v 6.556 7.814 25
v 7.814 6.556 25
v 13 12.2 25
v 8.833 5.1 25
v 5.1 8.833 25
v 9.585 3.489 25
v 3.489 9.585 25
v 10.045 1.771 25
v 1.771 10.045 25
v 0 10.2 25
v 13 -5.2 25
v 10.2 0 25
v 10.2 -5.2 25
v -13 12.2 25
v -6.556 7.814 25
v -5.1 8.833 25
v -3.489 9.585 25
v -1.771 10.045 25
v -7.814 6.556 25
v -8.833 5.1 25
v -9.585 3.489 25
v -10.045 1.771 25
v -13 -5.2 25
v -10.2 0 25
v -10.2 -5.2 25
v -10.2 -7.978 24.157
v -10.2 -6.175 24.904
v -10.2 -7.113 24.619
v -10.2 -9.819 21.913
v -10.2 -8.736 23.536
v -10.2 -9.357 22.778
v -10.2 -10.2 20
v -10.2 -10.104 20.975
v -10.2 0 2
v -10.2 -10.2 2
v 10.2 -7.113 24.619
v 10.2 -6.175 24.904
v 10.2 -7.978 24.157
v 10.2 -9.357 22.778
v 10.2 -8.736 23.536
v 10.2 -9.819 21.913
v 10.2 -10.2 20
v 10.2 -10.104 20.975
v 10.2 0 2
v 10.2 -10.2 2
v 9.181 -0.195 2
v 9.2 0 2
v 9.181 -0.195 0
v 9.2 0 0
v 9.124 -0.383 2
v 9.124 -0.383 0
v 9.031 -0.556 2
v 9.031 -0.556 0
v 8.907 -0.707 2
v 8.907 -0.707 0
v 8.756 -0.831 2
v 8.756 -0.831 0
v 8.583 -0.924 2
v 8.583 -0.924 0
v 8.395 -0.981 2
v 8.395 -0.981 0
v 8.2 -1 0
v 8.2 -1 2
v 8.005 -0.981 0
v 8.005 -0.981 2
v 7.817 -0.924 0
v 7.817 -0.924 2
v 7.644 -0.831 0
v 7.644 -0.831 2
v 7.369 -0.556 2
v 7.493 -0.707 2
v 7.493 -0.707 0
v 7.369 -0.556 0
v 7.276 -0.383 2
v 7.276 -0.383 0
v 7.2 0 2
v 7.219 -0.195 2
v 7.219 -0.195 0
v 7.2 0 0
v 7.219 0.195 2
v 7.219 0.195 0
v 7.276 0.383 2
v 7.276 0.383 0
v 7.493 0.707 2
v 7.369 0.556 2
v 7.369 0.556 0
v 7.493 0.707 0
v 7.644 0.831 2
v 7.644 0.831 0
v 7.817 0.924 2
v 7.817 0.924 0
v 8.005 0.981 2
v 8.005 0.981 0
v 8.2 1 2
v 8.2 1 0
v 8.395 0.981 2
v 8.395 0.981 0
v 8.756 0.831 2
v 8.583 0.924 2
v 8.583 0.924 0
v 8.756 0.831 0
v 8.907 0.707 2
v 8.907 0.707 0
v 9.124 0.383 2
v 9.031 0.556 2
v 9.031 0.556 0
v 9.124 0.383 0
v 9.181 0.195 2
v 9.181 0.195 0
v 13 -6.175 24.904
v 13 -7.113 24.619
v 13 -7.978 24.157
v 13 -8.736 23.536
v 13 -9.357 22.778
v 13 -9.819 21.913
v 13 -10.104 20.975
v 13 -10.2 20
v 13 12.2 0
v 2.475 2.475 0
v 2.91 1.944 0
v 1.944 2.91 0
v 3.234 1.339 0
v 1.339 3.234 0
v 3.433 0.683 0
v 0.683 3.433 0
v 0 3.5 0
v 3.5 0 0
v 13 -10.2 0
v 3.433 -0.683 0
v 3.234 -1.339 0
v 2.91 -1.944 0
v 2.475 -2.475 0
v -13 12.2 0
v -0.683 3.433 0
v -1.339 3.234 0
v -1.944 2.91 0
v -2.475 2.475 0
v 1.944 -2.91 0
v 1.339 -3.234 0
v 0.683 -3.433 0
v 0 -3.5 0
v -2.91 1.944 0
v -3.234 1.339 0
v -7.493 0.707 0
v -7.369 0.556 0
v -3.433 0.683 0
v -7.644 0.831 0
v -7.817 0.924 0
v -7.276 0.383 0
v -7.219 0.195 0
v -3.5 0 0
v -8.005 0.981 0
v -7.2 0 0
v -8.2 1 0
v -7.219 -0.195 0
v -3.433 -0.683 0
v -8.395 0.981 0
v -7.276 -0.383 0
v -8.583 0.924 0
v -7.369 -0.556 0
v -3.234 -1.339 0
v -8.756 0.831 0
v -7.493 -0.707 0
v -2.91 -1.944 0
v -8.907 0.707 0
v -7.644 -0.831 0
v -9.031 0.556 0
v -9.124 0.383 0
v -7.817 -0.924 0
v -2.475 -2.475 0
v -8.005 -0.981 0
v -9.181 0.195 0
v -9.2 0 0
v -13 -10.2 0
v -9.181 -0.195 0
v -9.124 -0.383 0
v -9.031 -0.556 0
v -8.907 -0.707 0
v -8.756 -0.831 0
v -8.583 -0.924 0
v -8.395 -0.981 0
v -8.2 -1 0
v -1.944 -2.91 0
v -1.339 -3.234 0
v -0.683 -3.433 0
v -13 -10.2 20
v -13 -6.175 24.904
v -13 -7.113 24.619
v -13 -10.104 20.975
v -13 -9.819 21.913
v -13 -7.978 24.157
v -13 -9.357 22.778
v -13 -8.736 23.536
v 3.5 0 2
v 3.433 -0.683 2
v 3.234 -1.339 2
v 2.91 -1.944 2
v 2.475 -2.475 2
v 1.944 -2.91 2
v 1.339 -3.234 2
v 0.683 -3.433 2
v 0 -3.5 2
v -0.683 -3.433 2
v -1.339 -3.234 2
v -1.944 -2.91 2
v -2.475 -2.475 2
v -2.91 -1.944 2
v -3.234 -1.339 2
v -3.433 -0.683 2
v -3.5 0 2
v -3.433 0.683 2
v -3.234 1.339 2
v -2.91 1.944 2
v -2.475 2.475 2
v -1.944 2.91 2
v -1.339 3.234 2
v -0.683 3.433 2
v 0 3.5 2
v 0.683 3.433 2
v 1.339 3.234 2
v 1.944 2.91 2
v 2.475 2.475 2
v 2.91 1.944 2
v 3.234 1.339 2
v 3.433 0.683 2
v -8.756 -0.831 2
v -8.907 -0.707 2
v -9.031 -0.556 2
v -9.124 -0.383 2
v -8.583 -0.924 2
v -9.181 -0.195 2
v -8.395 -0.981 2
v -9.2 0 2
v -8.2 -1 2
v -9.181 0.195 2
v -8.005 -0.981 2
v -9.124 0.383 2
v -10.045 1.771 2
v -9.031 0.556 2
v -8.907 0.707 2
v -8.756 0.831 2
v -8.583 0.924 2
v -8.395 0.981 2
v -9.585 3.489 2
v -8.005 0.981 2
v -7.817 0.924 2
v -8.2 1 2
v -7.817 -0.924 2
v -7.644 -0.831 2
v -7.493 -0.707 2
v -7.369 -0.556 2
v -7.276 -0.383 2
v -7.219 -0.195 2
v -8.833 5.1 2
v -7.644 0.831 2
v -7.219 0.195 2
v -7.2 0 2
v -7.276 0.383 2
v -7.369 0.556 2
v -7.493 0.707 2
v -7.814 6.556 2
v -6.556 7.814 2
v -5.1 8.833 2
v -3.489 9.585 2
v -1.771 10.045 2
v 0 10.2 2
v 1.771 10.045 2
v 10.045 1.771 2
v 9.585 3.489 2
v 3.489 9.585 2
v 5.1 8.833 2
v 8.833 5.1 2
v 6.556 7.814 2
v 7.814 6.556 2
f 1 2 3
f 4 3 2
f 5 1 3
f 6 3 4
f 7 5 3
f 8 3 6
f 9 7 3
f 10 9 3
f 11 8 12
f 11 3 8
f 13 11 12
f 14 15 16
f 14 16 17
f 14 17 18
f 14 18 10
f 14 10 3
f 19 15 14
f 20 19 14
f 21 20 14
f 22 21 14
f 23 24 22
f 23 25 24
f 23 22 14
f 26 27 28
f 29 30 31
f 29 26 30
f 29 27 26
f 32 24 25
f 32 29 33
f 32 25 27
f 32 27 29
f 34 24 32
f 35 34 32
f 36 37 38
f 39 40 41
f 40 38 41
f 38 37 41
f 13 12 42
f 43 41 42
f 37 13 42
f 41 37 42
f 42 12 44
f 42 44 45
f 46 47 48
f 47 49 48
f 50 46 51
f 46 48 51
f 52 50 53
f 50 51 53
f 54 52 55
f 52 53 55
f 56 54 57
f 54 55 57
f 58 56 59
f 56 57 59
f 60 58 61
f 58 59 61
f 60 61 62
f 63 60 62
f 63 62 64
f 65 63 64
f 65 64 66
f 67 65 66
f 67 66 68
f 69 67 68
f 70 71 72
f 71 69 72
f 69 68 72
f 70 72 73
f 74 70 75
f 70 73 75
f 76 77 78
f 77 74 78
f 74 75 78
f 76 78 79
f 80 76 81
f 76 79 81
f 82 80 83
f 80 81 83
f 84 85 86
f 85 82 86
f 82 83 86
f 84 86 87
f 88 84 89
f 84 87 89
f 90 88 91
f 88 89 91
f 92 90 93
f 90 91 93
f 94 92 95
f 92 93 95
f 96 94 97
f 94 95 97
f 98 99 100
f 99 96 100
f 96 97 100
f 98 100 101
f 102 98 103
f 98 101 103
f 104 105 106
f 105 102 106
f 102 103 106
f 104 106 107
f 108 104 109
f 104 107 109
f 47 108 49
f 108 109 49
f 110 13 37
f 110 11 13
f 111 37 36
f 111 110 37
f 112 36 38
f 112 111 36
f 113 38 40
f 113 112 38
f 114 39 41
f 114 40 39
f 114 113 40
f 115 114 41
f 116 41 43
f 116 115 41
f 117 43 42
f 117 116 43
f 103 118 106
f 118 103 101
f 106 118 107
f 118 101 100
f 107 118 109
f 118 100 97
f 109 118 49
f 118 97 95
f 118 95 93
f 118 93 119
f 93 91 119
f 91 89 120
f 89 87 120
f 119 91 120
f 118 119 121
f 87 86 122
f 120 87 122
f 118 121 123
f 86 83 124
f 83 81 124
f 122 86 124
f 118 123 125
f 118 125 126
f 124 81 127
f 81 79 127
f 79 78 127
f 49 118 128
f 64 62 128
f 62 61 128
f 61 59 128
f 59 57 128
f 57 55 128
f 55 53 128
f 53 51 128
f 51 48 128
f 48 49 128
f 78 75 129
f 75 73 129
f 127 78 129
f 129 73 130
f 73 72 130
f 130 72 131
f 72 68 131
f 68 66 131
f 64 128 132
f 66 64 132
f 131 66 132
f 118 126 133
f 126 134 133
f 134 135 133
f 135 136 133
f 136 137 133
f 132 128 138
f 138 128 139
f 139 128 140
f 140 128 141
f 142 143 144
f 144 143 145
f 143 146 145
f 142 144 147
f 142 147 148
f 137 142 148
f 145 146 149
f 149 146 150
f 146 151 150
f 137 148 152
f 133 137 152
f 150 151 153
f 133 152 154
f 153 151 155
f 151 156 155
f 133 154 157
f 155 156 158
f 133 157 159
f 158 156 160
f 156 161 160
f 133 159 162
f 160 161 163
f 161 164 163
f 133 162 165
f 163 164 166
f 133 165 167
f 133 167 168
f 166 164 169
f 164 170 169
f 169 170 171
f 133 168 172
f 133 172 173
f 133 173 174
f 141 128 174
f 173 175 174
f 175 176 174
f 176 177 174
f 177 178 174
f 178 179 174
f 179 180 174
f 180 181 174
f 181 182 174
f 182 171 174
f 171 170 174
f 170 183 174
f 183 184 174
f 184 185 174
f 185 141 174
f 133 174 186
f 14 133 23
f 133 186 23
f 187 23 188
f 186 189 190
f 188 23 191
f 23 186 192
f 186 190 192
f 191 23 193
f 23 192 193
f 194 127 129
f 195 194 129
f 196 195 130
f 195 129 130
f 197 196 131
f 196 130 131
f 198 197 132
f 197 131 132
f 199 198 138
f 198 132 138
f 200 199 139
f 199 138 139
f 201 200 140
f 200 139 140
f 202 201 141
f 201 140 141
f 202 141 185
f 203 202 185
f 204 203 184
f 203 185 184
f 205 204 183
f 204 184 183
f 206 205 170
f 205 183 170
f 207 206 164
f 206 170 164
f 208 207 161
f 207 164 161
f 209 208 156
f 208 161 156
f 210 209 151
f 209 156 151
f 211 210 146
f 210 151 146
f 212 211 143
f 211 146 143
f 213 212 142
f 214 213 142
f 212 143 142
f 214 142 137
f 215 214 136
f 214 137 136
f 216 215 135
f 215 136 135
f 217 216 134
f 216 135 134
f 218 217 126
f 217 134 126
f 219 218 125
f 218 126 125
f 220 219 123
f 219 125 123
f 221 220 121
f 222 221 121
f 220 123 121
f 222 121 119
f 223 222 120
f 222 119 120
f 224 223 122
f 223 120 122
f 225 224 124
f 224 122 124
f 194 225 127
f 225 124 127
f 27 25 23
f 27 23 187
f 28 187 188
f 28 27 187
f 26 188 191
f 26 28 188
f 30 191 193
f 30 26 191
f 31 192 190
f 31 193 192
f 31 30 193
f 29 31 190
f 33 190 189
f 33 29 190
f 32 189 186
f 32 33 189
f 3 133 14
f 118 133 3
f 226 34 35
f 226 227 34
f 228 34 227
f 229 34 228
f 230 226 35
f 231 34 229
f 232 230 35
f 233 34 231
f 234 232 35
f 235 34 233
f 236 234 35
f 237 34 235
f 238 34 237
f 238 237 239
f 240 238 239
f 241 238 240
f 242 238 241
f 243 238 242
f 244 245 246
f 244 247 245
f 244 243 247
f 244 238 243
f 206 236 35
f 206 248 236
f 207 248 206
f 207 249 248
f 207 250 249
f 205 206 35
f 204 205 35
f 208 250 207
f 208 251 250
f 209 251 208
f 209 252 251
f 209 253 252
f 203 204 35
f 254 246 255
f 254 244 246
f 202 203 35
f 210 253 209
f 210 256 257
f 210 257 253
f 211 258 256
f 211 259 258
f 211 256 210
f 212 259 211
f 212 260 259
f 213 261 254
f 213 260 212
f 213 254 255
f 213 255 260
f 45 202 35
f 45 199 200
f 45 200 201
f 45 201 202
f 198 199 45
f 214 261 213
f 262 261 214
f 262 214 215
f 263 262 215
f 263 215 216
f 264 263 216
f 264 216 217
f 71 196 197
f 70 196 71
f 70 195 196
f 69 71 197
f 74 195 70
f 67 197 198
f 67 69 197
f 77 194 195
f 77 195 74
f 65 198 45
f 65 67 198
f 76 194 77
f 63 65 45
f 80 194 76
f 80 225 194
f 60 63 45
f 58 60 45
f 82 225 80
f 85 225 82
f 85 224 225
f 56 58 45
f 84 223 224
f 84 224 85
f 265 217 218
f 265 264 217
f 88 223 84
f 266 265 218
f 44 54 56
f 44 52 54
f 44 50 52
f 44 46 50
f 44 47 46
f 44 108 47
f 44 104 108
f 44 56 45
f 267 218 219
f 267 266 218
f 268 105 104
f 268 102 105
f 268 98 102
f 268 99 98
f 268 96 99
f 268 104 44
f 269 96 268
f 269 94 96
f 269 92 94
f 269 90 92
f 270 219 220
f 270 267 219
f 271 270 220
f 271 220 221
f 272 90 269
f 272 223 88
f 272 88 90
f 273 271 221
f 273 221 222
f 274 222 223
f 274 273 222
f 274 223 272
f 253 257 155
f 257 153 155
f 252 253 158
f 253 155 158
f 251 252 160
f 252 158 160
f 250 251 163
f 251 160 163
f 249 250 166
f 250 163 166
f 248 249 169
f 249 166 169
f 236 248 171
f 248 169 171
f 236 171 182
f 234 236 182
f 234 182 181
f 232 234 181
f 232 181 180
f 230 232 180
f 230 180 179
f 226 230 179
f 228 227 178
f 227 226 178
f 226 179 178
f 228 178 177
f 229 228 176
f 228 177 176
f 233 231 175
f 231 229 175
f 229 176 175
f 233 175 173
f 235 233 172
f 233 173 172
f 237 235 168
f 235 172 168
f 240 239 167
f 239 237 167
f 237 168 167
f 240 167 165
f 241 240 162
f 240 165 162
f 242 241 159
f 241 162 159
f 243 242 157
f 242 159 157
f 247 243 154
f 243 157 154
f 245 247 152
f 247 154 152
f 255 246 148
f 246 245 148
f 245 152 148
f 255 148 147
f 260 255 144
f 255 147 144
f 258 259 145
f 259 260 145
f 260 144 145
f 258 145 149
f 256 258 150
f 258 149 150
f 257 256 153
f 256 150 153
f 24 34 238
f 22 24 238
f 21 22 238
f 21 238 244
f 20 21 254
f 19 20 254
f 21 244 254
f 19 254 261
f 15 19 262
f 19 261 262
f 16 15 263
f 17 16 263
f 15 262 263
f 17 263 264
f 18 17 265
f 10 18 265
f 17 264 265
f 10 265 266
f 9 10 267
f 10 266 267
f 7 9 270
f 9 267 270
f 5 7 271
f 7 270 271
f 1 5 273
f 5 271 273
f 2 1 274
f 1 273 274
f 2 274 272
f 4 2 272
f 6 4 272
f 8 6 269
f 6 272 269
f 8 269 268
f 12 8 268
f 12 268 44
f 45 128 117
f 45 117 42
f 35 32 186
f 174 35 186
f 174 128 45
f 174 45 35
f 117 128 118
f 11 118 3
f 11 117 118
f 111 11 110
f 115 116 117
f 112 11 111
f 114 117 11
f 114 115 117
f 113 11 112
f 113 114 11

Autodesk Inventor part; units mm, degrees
ref_plane "YZ Plane" through (0, 0, 0) normal (1, 0, 0) x (0, 1, 0)
ref_plane "XZ Plane" through (0, 0, 0) normal (0, 1, 0) x (-1, 0, 0)
ref_plane "XY Plane" through (0, 0, 0) normal (0, 0, 1) x (1, 0, 0)
sketch "StranaDoKotaca" plane through (0, 0, 0) normal (0, 0, 1) x (1, 0, 0)
  arc A0 (10.2, 0) -> (-10.2, 0) centre (0, 0) ccw
  circle A1 centre (-8.2, 0) radius 1
  line L0 (0, 7.2936) -> (0, -4.9994)
  circle A2 centre (8.2, 0) radius 1
  circle A3 centre (0, 0) radius 3.5
  line L1 (-10.2, 0) -> (-13, 0)
  line L2 (10.2, 0) -> (13, 0)
  line L3 (-13, 0) -> (-13, -10.2)
  line L4 (13, 0) -> (13, -10.2)
  line L5 (13, -10.2) -> (-13, -10.2)
  line L6 (0, 10.2) -> (0, 13)
  line L7 (-13, 0) -> (-13, 10.2)
  line L8 (-13, 10.2) -> (13, 10.2)
  line L9 (13, 10.2) -> (13, 0)
  arc A4 (13, 0) -> (8.0598, 10.2) centre (0, 0) ccw
  arc A5 (-8.0598, 10.2) -> (-13, 0) centre (0, 0) ccw
  dimension "d0" = 20.4
  dimension "d4" = 2
  dimension "d5" = 7
  dimension "d6" = 10.2
  dimension "d7" = 10.2
extrude "BocnaStrana" add sketch "StranaDoKotaca" along normal blind 2
sketch "Sketch2" plane through (0, 0, 2) normal (0, 0, 1) x (1, 0, 0)
  arc A0 (10.2, 0) -> (-10.2, 0) centre (0, 0) ccw
  line L0 (-10.2, 0) -> (-10.2, -10.2)
  line L1 (-13, -10.2) -> (13, -10.2) projected
  line L2 (10.2, 0) -> (10.2, -10.2)
  line L3 (13, 10.2) -> (-13, 10.2) projected
  line L4 (-13, 10.2) -> (-13, -10.2) projected
  line L5 (13, -10.2) -> (13, 10.2) projected
  point P0 (0, 10.2)
  dimension "d12" = 20.4
extrude "Tijelo" add sketch "Sketch2" along normal blind 23 contours A0 L3 L5 L1 L2 | A0 L0 L1 L4 L3
fillet "Rubnik" radius 5 2 edges at (-11.6, -10.2, 25) (11.6, -10.2, 25)
sketch "Sketch3" plane through (-13, 10.2, 0) normal (0, 1, 0) x (1, 0, 0)
  line L0 (26, 0) -> (0, 0) projected
  line L1 (0, 0) -> (0, -25) projected
  line L2 (13, -25) -> (0, -25) projected
  line L3 (13, -2) -> (13, -25) projected
  line L4 (26, -25) -> (13, -25) projected
  line L5 (26, 0) -> (26, -25) projected
  point P0 (13, 0)
extrude "Extrusion3" add sketch "Sketch3" along normal blind 2
properties part number "DrzacZaMotor"
